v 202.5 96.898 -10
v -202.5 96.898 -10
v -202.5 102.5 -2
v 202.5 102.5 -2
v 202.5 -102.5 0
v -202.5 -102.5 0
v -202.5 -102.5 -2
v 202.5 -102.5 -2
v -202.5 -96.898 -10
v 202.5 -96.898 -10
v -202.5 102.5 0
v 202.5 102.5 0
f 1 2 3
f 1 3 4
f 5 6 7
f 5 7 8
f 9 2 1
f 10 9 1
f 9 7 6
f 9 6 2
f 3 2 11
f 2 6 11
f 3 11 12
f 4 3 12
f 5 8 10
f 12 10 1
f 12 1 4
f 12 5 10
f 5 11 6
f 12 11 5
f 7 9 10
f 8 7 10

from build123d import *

# Parameters (mm, degrees)
SKETCH_1_W             = 405
SKETCH_1_H             = 205
SM_BASE_FLANGE_1_DEPTH = 10
CHAMFER_1_SIZE         = 8
CHAMFER_1_SIZE2        = 5.601660306
CHAMFER_2_SIZE         = 8
CHAMFER_2_SIZE2        = 5.601660306


# Sheet-metal steps are written as plain solids
with BuildPart() as part:
    # Sketch 1 → 基体-法兰1 (new body)
    with BuildSketch(Plane.XY):
        Rectangle(SKETCH_1_W, SKETCH_1_H)
    extrude(amount=-SM_BASE_FLANGE_1_DEPTH)

    # 倒角1
    chamfer_1_edges = [part.edges().sort_by_distance(p)[0] for p in [
        (0, 102.5, -10),
    ]]
    chamfer_1_side = [part.faces().sort_by_distance(p)[0] for p in [
        (0, 102.5, -5),
    ]]
    chamfer(chamfer_1_edges, length=CHAMFER_1_SIZE, length2=CHAMFER_1_SIZE2, reference=chamfer_1_side[0])

    # 倒角2
    chamfer_2_edges = [part.edges().sort_by_distance(p)[0] for p in [
        (0, -102.5, -10),
    ]]
    chamfer_2_side = [part.faces().sort_by_distance(p)[0] for p in [
        (0, -102.5, -5),
    ]]
    chamfer(chamfer_2_edges, length=CHAMFER_2_SIZE, length2=CHAMFER_2_SIZE2, reference=chamfer_2_side[0])


solid = part.part
